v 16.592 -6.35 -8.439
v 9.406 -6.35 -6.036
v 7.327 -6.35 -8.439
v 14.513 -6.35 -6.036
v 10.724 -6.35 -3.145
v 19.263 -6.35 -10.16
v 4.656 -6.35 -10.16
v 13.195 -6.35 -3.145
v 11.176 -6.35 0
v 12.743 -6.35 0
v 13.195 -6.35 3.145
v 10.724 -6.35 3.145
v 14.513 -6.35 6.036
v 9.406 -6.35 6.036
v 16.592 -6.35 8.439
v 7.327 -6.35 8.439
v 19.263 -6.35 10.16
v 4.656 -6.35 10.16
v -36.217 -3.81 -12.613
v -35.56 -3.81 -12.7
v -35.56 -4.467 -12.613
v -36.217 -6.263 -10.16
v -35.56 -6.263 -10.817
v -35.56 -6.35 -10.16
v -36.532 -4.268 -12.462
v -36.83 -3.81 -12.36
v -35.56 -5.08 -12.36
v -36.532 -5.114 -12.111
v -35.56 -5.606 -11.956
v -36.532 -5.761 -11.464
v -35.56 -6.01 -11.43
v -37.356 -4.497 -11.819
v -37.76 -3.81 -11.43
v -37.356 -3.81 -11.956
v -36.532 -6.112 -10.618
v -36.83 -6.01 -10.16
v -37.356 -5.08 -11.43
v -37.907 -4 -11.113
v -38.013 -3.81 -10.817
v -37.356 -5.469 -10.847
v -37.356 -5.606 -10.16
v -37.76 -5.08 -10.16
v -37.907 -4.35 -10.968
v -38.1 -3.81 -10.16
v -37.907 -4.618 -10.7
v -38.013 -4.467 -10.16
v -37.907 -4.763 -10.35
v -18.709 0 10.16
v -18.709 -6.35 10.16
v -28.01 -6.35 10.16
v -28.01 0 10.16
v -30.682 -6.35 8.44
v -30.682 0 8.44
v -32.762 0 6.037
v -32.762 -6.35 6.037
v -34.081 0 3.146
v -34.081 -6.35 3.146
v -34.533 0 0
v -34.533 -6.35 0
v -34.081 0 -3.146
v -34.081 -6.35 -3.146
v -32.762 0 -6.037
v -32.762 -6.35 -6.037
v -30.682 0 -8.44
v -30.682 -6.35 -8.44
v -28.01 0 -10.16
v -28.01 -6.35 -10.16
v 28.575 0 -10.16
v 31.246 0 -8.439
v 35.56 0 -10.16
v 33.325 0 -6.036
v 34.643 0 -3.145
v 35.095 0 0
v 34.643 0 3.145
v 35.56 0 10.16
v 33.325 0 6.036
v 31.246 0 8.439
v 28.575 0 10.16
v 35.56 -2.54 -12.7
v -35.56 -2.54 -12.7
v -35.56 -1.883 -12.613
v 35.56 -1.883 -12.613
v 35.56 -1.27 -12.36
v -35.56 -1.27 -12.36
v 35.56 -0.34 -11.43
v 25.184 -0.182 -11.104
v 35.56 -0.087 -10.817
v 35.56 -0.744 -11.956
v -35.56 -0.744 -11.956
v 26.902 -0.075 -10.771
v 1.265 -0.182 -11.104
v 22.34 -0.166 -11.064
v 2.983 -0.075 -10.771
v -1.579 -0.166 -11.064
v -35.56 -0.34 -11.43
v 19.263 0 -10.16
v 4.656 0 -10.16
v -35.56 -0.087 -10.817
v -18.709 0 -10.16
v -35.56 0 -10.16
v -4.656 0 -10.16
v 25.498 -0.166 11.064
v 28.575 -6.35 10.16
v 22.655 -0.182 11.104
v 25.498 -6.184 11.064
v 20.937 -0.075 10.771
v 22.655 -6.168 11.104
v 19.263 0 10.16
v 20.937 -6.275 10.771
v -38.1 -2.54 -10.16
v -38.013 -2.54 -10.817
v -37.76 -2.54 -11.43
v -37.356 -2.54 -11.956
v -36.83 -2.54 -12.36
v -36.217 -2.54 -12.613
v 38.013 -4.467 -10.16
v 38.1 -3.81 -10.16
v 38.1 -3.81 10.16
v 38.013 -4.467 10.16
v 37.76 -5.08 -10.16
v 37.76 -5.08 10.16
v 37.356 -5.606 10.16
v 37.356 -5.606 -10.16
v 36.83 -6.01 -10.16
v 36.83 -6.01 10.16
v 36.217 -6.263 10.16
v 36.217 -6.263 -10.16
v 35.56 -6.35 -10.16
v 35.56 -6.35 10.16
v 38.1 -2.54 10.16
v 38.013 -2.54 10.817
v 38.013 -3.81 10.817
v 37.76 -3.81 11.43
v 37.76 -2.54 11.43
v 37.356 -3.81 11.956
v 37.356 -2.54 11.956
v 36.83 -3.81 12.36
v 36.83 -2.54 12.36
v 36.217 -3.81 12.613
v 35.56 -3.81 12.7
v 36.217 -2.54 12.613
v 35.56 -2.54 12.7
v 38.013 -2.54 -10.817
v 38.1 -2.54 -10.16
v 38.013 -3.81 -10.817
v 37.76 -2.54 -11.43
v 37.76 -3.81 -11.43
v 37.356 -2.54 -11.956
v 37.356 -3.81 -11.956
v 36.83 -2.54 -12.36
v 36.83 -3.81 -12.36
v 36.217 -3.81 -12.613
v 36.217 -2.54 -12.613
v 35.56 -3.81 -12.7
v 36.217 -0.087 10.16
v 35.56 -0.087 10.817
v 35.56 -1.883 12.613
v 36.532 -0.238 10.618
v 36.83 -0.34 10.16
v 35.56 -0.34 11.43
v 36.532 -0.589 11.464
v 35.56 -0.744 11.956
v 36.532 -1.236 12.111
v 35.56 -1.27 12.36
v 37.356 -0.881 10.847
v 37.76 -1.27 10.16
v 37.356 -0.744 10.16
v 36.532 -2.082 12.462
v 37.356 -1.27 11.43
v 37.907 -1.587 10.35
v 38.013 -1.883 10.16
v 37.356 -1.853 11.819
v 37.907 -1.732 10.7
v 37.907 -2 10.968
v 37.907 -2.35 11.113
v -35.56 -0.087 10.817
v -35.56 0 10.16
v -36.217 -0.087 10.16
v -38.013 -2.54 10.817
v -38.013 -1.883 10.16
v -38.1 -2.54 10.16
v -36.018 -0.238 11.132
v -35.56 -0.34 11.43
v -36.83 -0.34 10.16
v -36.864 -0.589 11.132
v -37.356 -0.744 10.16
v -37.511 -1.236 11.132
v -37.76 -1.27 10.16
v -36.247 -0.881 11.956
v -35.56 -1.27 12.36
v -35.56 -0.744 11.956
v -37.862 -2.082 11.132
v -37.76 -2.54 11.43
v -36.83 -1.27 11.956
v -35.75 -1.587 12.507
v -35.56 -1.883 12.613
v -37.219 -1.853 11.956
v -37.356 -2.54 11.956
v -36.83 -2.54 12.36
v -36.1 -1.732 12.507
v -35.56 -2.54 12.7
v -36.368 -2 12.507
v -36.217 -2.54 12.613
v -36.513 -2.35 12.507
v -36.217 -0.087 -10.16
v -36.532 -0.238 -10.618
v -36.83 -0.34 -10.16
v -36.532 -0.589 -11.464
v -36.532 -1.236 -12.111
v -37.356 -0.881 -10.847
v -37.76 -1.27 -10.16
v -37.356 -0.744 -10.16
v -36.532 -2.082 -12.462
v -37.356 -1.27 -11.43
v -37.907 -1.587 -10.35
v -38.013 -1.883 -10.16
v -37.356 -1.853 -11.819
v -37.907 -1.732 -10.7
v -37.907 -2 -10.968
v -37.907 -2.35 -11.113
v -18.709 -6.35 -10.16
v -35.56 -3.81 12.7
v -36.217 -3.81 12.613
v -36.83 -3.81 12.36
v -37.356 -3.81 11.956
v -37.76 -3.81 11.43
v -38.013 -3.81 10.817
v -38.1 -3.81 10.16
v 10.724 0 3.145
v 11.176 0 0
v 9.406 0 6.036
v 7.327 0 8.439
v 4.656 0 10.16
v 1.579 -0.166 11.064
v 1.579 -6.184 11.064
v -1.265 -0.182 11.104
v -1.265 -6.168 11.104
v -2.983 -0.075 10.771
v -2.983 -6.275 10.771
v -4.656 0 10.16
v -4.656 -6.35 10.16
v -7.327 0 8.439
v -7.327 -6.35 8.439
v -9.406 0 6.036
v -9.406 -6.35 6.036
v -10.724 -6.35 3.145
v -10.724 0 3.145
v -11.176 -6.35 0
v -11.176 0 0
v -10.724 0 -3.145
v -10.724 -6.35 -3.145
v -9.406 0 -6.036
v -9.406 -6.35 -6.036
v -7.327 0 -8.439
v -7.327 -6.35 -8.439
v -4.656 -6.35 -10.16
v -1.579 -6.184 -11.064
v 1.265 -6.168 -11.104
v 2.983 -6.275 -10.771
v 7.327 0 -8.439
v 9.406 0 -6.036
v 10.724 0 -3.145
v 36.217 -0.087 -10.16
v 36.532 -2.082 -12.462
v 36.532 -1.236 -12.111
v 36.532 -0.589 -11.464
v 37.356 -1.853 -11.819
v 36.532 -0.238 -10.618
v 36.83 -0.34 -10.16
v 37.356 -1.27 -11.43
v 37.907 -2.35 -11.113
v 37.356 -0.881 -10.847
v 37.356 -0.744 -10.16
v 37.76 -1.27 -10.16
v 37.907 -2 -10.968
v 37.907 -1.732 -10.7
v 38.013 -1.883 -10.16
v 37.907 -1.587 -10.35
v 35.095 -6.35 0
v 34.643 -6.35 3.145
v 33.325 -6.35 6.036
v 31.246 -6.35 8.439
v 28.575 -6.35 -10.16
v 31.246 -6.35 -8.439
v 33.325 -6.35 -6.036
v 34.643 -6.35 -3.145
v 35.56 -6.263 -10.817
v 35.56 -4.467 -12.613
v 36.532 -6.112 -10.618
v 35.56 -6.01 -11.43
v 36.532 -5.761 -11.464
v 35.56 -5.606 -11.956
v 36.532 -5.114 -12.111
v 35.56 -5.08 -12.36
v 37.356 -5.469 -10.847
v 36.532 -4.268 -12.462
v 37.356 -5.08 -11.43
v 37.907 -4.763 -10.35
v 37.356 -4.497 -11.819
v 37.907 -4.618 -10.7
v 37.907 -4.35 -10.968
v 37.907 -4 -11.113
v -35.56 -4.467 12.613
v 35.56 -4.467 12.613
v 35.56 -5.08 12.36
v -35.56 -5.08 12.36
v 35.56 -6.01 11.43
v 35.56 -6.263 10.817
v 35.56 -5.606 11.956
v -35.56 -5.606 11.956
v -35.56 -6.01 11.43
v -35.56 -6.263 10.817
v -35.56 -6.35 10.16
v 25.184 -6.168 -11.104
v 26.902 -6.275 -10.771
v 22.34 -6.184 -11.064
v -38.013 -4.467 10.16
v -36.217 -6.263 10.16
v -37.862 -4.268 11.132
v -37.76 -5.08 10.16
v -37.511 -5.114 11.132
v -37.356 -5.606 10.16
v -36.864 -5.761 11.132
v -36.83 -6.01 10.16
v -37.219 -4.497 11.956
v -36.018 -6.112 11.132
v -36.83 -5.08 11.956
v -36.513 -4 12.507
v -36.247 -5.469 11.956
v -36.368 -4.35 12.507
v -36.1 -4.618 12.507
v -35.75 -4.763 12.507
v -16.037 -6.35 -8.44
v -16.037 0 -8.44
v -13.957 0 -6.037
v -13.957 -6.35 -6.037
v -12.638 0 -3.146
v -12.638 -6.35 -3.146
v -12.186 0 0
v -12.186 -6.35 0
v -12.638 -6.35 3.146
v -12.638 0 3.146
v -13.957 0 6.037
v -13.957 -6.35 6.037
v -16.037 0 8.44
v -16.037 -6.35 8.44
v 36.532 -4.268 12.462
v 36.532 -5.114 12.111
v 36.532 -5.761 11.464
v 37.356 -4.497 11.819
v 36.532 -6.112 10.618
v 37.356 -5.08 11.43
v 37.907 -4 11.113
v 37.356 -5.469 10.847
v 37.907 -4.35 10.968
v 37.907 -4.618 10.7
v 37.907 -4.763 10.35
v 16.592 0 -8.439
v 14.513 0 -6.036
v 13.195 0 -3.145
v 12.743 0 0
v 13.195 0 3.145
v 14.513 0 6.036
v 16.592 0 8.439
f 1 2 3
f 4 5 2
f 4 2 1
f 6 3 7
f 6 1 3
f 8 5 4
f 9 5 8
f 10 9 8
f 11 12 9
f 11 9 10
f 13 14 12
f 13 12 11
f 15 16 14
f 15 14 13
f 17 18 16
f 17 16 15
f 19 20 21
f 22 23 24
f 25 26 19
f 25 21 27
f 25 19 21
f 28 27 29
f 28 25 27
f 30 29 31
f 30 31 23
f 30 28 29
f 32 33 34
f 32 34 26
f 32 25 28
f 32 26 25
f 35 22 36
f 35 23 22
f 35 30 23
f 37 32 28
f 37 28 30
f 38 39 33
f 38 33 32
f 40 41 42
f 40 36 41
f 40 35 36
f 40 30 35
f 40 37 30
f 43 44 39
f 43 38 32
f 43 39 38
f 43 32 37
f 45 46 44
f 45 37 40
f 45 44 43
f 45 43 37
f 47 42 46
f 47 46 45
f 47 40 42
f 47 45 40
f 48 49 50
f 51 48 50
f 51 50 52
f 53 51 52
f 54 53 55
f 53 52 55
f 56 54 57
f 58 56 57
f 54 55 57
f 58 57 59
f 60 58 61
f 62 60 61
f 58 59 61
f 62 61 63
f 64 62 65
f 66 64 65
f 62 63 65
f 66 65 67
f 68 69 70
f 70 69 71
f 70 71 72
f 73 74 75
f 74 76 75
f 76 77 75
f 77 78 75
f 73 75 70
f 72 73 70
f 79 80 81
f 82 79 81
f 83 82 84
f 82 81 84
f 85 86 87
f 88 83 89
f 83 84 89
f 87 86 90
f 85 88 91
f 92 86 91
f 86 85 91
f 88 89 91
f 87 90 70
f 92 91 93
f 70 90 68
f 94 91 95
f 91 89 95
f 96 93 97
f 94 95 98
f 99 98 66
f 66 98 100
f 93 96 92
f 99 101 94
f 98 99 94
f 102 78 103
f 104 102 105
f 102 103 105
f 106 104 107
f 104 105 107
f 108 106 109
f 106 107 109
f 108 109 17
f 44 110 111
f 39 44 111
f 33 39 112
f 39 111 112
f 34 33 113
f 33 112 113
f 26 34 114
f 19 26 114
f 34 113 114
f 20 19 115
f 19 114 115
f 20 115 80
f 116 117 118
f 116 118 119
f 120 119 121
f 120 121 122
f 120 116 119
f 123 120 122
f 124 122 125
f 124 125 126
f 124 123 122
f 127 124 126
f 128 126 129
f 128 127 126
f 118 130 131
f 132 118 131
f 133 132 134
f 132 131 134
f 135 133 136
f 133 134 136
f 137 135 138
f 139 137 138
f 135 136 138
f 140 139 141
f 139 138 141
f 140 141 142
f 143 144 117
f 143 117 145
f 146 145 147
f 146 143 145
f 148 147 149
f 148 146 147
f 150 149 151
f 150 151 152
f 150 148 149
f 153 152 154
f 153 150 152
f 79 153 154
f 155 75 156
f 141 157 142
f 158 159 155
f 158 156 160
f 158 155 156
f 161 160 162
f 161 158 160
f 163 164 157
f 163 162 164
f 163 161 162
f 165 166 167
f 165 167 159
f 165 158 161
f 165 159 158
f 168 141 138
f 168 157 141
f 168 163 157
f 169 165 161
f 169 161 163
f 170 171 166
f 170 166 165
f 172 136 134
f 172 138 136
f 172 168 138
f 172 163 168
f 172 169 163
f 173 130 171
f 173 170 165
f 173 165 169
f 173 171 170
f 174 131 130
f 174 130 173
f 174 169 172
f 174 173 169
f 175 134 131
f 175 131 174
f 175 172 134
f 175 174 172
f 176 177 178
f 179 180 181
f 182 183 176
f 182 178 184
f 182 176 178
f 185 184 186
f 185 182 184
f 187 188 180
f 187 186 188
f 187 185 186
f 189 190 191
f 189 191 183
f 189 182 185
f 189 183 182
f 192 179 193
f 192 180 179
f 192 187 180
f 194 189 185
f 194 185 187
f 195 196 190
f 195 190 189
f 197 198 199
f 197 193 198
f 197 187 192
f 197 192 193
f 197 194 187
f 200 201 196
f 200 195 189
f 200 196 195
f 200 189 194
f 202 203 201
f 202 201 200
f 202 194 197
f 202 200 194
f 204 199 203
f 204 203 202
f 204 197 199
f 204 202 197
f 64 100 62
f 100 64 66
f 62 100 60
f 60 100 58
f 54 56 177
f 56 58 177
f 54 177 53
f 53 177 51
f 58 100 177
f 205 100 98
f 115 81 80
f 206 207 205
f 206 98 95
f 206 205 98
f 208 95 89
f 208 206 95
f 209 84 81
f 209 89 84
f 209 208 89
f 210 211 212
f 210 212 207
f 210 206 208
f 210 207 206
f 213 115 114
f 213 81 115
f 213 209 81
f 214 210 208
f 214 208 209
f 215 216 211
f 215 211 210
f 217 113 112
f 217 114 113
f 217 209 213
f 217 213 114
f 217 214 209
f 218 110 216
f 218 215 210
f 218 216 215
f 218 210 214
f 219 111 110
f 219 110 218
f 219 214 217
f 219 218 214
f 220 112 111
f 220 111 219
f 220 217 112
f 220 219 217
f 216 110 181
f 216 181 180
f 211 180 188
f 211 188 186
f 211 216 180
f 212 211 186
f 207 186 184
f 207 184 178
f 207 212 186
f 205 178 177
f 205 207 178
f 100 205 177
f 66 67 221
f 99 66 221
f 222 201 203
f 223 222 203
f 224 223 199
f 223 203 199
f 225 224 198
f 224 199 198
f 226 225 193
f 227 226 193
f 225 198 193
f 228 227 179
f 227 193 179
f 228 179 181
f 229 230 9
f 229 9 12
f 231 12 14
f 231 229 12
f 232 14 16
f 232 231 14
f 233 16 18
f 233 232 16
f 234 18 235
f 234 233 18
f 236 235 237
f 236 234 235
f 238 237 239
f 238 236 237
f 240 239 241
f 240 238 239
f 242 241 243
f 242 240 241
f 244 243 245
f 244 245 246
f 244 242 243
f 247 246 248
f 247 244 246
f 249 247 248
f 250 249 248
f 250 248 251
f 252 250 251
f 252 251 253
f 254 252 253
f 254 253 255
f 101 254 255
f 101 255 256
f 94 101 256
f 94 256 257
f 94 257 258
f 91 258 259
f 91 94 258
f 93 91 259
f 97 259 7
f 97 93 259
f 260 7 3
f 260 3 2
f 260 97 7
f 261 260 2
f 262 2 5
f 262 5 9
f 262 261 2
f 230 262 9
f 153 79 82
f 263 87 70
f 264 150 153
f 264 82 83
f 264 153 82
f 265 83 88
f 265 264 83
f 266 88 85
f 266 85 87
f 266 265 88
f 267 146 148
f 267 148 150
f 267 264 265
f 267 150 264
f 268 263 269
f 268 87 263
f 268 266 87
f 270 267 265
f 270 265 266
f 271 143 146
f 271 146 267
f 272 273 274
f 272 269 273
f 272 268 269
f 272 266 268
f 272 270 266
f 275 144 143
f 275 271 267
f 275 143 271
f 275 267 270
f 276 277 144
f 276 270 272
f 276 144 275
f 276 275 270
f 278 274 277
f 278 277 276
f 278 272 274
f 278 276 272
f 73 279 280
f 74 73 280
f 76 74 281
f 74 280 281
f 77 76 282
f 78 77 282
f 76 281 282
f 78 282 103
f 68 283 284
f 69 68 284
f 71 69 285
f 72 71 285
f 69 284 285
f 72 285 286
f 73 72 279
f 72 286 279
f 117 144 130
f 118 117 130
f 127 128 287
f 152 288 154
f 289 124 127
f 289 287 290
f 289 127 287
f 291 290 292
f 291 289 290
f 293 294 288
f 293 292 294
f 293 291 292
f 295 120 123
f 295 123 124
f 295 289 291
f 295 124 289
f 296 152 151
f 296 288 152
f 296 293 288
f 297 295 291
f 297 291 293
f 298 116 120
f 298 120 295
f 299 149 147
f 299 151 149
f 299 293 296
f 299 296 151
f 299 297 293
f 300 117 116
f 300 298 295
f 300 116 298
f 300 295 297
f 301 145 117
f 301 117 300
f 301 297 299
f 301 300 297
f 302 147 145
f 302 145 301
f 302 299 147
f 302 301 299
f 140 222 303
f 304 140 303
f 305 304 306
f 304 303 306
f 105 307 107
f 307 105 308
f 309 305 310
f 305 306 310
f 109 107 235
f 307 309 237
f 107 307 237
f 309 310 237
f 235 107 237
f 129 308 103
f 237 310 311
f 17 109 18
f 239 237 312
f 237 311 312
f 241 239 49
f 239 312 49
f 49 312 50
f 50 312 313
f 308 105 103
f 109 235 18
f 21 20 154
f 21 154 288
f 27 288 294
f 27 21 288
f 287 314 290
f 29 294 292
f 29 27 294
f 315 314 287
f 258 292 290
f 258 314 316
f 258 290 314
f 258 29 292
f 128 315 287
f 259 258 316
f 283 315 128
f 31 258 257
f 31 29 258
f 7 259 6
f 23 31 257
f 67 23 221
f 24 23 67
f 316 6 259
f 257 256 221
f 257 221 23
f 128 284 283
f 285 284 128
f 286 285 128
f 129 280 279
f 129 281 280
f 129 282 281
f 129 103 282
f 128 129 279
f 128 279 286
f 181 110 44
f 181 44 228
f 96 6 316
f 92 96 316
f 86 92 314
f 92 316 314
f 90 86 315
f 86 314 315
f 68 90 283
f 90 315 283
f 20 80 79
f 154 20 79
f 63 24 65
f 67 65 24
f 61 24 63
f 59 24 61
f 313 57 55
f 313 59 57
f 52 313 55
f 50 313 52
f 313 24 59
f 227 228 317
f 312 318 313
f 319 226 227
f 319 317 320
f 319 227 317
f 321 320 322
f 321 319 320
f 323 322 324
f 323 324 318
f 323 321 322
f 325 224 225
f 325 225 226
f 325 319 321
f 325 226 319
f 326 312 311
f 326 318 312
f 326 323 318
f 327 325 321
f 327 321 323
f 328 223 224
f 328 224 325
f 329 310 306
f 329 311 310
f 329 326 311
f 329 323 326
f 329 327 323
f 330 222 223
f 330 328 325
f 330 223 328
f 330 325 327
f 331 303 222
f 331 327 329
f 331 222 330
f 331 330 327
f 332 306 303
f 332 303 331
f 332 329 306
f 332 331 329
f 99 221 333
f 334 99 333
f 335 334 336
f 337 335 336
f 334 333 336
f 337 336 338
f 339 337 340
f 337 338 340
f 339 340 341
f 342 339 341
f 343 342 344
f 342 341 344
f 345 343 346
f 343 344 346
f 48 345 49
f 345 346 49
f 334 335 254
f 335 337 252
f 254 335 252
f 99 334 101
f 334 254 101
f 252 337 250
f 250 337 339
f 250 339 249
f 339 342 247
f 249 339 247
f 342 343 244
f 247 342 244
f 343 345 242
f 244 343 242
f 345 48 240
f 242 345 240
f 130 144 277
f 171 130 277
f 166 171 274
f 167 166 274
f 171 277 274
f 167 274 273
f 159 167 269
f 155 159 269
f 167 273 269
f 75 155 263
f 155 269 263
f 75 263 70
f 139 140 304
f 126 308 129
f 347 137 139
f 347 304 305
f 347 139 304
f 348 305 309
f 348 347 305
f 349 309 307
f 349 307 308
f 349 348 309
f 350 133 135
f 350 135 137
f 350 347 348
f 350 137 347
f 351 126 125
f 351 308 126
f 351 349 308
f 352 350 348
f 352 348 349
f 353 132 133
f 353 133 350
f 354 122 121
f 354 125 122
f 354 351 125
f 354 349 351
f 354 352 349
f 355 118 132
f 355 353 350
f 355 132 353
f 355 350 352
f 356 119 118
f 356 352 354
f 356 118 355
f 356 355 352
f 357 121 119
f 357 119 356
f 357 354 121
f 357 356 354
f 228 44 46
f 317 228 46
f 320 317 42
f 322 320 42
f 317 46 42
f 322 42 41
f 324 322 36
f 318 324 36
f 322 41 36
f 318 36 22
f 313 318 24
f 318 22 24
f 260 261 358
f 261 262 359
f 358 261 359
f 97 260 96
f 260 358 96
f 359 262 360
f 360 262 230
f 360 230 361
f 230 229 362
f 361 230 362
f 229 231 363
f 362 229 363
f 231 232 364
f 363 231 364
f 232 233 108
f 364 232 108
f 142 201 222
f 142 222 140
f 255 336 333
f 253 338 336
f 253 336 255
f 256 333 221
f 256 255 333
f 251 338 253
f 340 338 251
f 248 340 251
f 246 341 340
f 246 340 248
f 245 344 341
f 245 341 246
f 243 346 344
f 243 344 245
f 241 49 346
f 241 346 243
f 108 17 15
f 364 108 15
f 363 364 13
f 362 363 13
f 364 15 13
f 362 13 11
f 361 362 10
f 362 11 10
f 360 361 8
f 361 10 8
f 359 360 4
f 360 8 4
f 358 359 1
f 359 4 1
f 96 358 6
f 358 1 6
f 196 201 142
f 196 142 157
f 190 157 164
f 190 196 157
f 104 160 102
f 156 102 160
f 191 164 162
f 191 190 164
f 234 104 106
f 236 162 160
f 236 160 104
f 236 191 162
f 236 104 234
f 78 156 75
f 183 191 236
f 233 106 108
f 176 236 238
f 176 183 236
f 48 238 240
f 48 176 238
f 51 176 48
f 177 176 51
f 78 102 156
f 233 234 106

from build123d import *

# Parameters (mm, degrees)
F0_W         = 76.2
F0_H         = 25.4
F0_R         = 11.176
F1_DEPTH     = 6.35
F2_T1_DEPTH  = 71.12
F2_T3_DEPTH  = 1.27
F2_T5_DEPTH  = 20.32
F2_S9_W      = 2.54
F2_S9_H      = 2.54
F2_T10_DEPTH = 2.54
F2_S15_W     = 2.54
F2_S15_H     = 2.54
F2_T16_DEPTH = 2.54
F2_S21_W     = 2.54
F2_S21_H     = 2.54
F2_T22_DEPTH = 2.54
F2_S27_W     = 2.54
F2_S27_H     = 2.54
F2_T28_DEPTH = 2.54
F2_S33_W     = 2.54
F2_S33_H     = 2.54
F2_T34_DEPTH = 2.54
F2_S39_W     = 2.54
F2_S39_H     = 2.54
F2_T40_DEPTH = 2.54
F2_S45_W     = 2.54
F2_S45_H     = 2.54
F2_T46_DEPTH = 2.54
F2_S51_W     = 2.54
F2_S51_H     = 2.54
F2_T52_DEPTH = 2.54
F4_DEPTH     = 6.35


# Not quite as in the source:
# - a fillet or chamfer that OpenCascade refuses, or shapes differently, is made with other operations: its cross-section is extruded or revolved along the edge and cut away or added


with BuildPart() as f1:
    # F0 (on Front) → F1 (new body)
    with BuildSketch(Plane.XZ):
        Rectangle(F0_W, F0_H)
        Circle(F0_R, mode=Mode.SUBTRACT)
    extrude(amount=F1_DEPTH)

    # F2: fillet of radius 2.54 on 12 edges, made by hand

    # F2_s2 → F2_t1 (cut)
    with BuildSketch(Plane.YZ.offset(-35.56)):
        with BuildLine():
            ThreePointArc((-2.54, -12.7), (-0.7439487758, -11.9560512242), (0, -10.16))
            Line((0, -10.16), (0, -12.7))
            Line((0, -12.7), (-2.54, -12.7))
        make_face()
        with BuildLine():
            ThreePointArc((-3.81, -12.7), (-5.6060512242, -11.9560512242), (-6.35, -10.16))
            Line((-6.35, -10.16), (-6.35, -12.7))
            Line((-6.35, -12.7), (-3.81, -12.7))
        make_face()
        with BuildLine():
            ThreePointArc((-2.54, 12.7), (-0.7439487758, 11.9560512242), (0, 10.16))
            Line((0, 10.16), (0, 12.7))
            Line((0, 12.7), (-2.54, 12.7))
        make_face()
        with BuildLine():
            ThreePointArc((-3.81, 12.7), (-5.6060512242, 11.9560512242), (-6.35, 10.16))
            Line((-6.35, 10.16), (-6.35, 12.7))
            Line((-6.35, 12.7), (-3.81, 12.7))
        make_face()
    extrude(amount=F2_T1_DEPTH, mode=Mode.SUBTRACT)

    # F2_s4 → F2_t3 (cut)
    with BuildSketch(Plane.XZ.offset(2.54)):
        with BuildLine():
            ThreePointArc((-38.1, -10.16), (-37.3560512242, -11.9560512242), (-35.56, -12.7))
            Line((-35.56, -12.7), (-38.1, -12.7))
            Line((-38.1, -12.7), (-38.1, -10.16))
        make_face()
        with BuildLine():
            ThreePointArc((38.1, -10.16), (37.3560512242, -11.9560512242), (35.56, -12.7))
            Line((35.56, -12.7), (38.1, -12.7))
            Line((38.1, -12.7), (38.1, -10.16))
        make_face()
        with BuildLine():
            ThreePointArc((38.1, 10.16), (37.3560512242, 11.9560512242), (35.56, 12.7))
            Line((35.56, 12.7), (38.1, 12.7))
            Line((38.1, 12.7), (38.1, 10.16))
        make_face()
        with BuildLine():
            ThreePointArc((-35.56, 12.7), (-37.3560512242, 11.9560512242), (-38.1, 10.16))
            Line((-38.1, 10.16), (-38.1, 12.7))
            Line((-38.1, 12.7), (-35.56, 12.7))
        make_face()
    extrude(amount=F2_T3_DEPTH, mode=Mode.SUBTRACT)

    # F2_s6 → F2_t5 (cut)
    with BuildSketch(Plane.XY.offset(-10.16)):
        with BuildLine():
            ThreePointArc((-38.1, -3.81), (-37.3560512242, -5.6060512242), (-35.56, -6.35))
            Line((-35.56, -6.35), (-38.1, -6.35))
            Line((-38.1, -6.35), (-38.1, -3.81))
        make_face()
        with BuildLine():
            ThreePointArc((-38.1, -2.54), (-37.3560512242, -0.7439487758), (-35.56, 0))
            Line((-35.56, 0), (-38.1, 0))
            Line((-38.1, 0), (-38.1, -2.54))
        make_face()
        with BuildLine():
            ThreePointArc((38.1, -3.81), (37.3560512242, -5.6060512242), (35.56, -6.35))
            Line((35.56, -6.35), (38.1, -6.35))
            Line((38.1, -6.35), (38.1, -3.81))
        make_face()
        with BuildLine():
            ThreePointArc((38.1, -2.54), (37.3560512242, -0.7439487758), (35.56, 0))
            Line((35.56, 0), (38.1, 0))
            Line((38.1, 0), (38.1, -2.54))
        make_face()
    extrude(amount=F2_T5_DEPTH, mode=Mode.SUBTRACT)


with BuildPart() as f2_tool8:
    # F2_s9 → F2_t10 (new body)
    with BuildSketch(Plane.YZ.offset(-35.56)):
        with Locations((-1.27, -11.43)):
            Rectangle(F2_S9_W, F2_S9_H)
    extrude(amount=-F2_T10_DEPTH)

    # F2_s11 → F2_t12 (revolve, cut)
    with BuildSketch(Plane(origin=(-35.56, -2.54, -10.16), x_dir=(0, -0.7071067812, 0.7071067812), z_dir=(0, -0.7071067812, -0.7071067812))):
        with BuildLine():
            ThreePointArc((0, -2.54), (2.54, 0), (0, 2.54))
            Line((0, 2.54), (0, -2.54))
        make_face()
    revolve(axis=Axis((-35.56, -2.54, -10.16), (-1, 0, 0)), mode=Mode.SUBTRACT)


with BuildPart() as f1_1:
    add(f1.part)

    # F2_t7: cut F2_tool8
    add(f2_tool8.part, mode=Mode.SUBTRACT)


with BuildPart() as f2_tool14:
    # F2_s15 → F2_t16 (new body)
    with BuildSketch(Plane.YZ.offset(35.56)):
        with Locations((-1.27, -11.43)):
            Rectangle(F2_S15_W, F2_S15_H)
    extrude(amount=F2_T16_DEPTH)

    # F2_s17 → F2_t18 (revolve, cut)
    with BuildSketch(Plane(origin=(35.56, -2.54, -10.16), x_dir=(0, -0.7071067812, 0.7071067812), z_dir=(0, 0.7071067812, 0.7071067812))):
        with BuildLine():
            ThreePointArc((0, -2.54), (2.54, 0), (0, 2.54))
            Line((0, 2.54), (0, -2.54))
        make_face()
    revolve(axis=Axis((35.56, -2.54, -10.16), (1, 0, 0)), mode=Mode.SUBTRACT)


with BuildPart() as f1_2:
    add(f1_1.part)

    # F2_t13: cut F2_tool14
    add(f2_tool14.part, mode=Mode.SUBTRACT)


with BuildPart() as f2_tool20:
    # F2_s21 → F2_t22 (new body)
    with BuildSketch(Plane.YZ.offset(-35.56)):
        with Locations((-5.08, -11.43)):
            Rectangle(F2_S21_W, F2_S21_H)
    extrude(amount=-F2_T22_DEPTH)

    # F2_s23 → F2_t24 (revolve, cut)
    with BuildSketch(Plane(origin=(-35.56, -3.81, -10.16), x_dir=(0, 0.7071067812, 0.7071067812), z_dir=(0, -0.7071067812, 0.7071067812))):
        with BuildLine():
            ThreePointArc((0, -2.54), (2.54, 0), (0, 2.54))
            Line((0, 2.54), (0, -2.54))
        make_face()
    revolve(axis=Axis((-35.56, -3.81, -10.16), (-1, 0, 0)), mode=Mode.SUBTRACT)


with BuildPart() as f1_3:
    add(f1_2.part)

    # F2_t19: cut F2_tool20
    add(f2_tool20.part, mode=Mode.SUBTRACT)


with BuildPart() as f2_tool26:
    # F2_s27 → F2_t28 (new body)
    with BuildSketch(Plane.YZ.offset(35.56)):
        with Locations((-5.08, -11.43)):
            Rectangle(F2_S27_W, F2_S27_H)
    extrude(amount=F2_T28_DEPTH)

    # F2_s29 → F2_t30 (revolve, cut)
    with BuildSketch(Plane(origin=(35.56, -3.81, -10.16), x_dir=(0, 0.7071067812, 0.7071067812), z_dir=(0, 0.7071067812, -0.7071067812))):
        with BuildLine():
            ThreePointArc((0, -2.54), (2.54, 0), (0, 2.54))
            Line((0, 2.54), (0, -2.54))
        make_face()
    revolve(axis=Axis((35.56, -3.81, -10.16), (1, 0, 0)), mode=Mode.SUBTRACT)


with BuildPart() as f1_4:
    add(f1_3.part)

    # F2_t25: cut F2_tool26
    add(f2_tool26.part, mode=Mode.SUBTRACT)


with BuildPart() as f2_tool32:
    # F2_s33 → F2_t34 (new body)
    with BuildSketch(Plane.XY.offset(10.16)):
        with Locations((-36.83, -5.08)):
            Rectangle(F2_S33_W, F2_S33_H)
    extrude(amount=F2_T34_DEPTH)

    # F2_s35 → F2_t36 (revolve, cut)
    with BuildSketch(Plane(origin=(-35.56, -3.81, 10.16), x_dir=(0.7071067812, 0.7071067812, 0), z_dir=(0.7071067812, -0.7071067812, 0))):
        with BuildLine():
            ThreePointArc((0, -2.54), (2.54, 0), (0, 2.54))
            Line((0, 2.54), (0, -2.54))
        make_face()
    revolve(axis=Axis((-35.56, -3.81, 10.16), (0, 0, 1)), mode=Mode.SUBTRACT)


with BuildPart() as f1_5:
    add(f1_4.part)

    # F2_t31: cut F2_tool32
    add(f2_tool32.part, mode=Mode.SUBTRACT)


with BuildPart() as f2_tool38:
    # F2_s39 → F2_t40 (new body)
    with BuildSketch(Plane.XY.offset(10.16)):
        with Locations((-36.83, -1.27)):
            Rectangle(F2_S39_W, F2_S39_H)
    extrude(amount=F2_T40_DEPTH)

    # F2_s41 → F2_t42 (revolve, cut)
    with BuildSketch(Plane(origin=(-35.56, -2.54, 10.16), x_dir=(0.7071067812, -0.7071067812, 0), z_dir=(-0.7071067812, -0.7071067812, 0))):
        with BuildLine():
            ThreePointArc((0, -2.54), (2.54, 0), (0, 2.54))
            Line((0, 2.54), (0, -2.54))
        make_face()
    revolve(axis=Axis((-35.56, -2.54, 10.16), (0, 0, 1)), mode=Mode.SUBTRACT)


with BuildPart() as f1_6:
    add(f1_5.part)

    # F2_t37: cut F2_tool38
    add(f2_tool38.part, mode=Mode.SUBTRACT)


with BuildPart() as f2_tool44:
    # F2_s45 → F2_t46 (new body)
    with BuildSketch(Plane.YZ.offset(35.56)):
        with Locations((-5.08, 11.43)):
            Rectangle(F2_S45_W, F2_S45_H)
    extrude(amount=F2_T46_DEPTH)

    # F2_s47 → F2_t48 (revolve, cut)
    with BuildSketch(Plane(origin=(35.56, -3.81, 10.16), x_dir=(0, 0.7071067812, -0.7071067812), z_dir=(0, -0.7071067812, -0.7071067812))):
        with BuildLine():
            ThreePointArc((0, -2.54), (2.54, 0), (0, 2.54))
            Line((0, 2.54), (0, -2.54))
        make_face()
    revolve(axis=Axis((35.56, -3.81, 10.16), (1, 0, 0)), mode=Mode.SUBTRACT)


with BuildPart() as f1_7:
    add(f1_6.part)

    # F2_t43: cut F2_tool44
    add(f2_tool44.part, mode=Mode.SUBTRACT)


with BuildPart() as f2_tool50:
    # F2_s51 → F2_t52 (new body)
    with BuildSketch(Plane.YZ.offset(35.56)):
        with Locations((-1.27, 11.43)):
            Rectangle(F2_S51_W, F2_S51_H)
    extrude(amount=F2_T52_DEPTH)

    # F2_s53 → F2_t54 (revolve, cut)
    with BuildSketch(Plane(origin=(35.56, -2.54, 10.16), x_dir=(0, -0.7071067812, -0.7071067812), z_dir=(0, -0.7071067812, 0.7071067812))):
        with BuildLine():
            ThreePointArc((0, -2.54), (2.54, 0), (0, 2.54))
            Line((0, 2.54), (0, -2.54))
        make_face()
    revolve(axis=Axis((35.56, -2.54, 10.16), (1, 0, 0)), mode=Mode.SUBTRACT)


with BuildPart() as f1_8:
    add(f1_7.part)

    # F2_t49: cut F2_tool50
    add(f2_tool50.part, mode=Mode.SUBTRACT)

    # F3 (on face) → F4 (cut)
    with BuildSketch(Plane.XZ.offset(6.35)):
        with BuildLine():
            ThreePointArc((-18.7094612276, -10.16), (-13.9572398788, -6.0369996274), (-12.1859761156, 0))
            ThreePointArc((-12.1859761156, 0), (-13.9572398788, 6.0369996274), (-18.7094612276, 10.16))
            Line((-18.7094612276, 10.16), (-28.0096651758, 10.16))
            ThreePointArc((-28.0096651758, 10.16), (-34.5331502877, 0), (-28.0096651758, -10.16))
            Line((-28.0096651758, -10.16), (-18.7094612276, -10.16))
        make_face()
        with BuildLine():
            ThreePointArc((28.5749689082, -10.16), (33.3248489457, -6.0360861565), (35.0950720022, 0))
            ThreePointArc((35.0950720022, 0), (33.3248489457, 6.0360861565), (28.5749689082, 10.16))
            Line((28.5749689082, 10.16), (19.2631750961, 10.16))
            ThreePointArc((19.2631750961, 10.16), (12.7430720022, 0), (19.2631750961, -10.16))
            Line((19.2631750961, -10.16), (28.5749689082, -10.16))
        make_face()
        with BuildLine():
            Line((19.2631750961, 10.16), (28.5749689082, 10.16))
            ThreePointArc((28.5749689082, 10.16), (23.9190720022, 11.176), (19.2631750961, 10.16))
        make_face()
        with BuildLine():
            ThreePointArc((19.2631750961, -10.16), (23.9190720022, -11.176), (28.5749689082, -10.16))
            Line((28.5749689082, -10.16), (19.2631750961, -10.16))
        make_face()
    extrude(amount=-F4_DEPTH, mode=Mode.SUBTRACT)


solid = f1_8.part
